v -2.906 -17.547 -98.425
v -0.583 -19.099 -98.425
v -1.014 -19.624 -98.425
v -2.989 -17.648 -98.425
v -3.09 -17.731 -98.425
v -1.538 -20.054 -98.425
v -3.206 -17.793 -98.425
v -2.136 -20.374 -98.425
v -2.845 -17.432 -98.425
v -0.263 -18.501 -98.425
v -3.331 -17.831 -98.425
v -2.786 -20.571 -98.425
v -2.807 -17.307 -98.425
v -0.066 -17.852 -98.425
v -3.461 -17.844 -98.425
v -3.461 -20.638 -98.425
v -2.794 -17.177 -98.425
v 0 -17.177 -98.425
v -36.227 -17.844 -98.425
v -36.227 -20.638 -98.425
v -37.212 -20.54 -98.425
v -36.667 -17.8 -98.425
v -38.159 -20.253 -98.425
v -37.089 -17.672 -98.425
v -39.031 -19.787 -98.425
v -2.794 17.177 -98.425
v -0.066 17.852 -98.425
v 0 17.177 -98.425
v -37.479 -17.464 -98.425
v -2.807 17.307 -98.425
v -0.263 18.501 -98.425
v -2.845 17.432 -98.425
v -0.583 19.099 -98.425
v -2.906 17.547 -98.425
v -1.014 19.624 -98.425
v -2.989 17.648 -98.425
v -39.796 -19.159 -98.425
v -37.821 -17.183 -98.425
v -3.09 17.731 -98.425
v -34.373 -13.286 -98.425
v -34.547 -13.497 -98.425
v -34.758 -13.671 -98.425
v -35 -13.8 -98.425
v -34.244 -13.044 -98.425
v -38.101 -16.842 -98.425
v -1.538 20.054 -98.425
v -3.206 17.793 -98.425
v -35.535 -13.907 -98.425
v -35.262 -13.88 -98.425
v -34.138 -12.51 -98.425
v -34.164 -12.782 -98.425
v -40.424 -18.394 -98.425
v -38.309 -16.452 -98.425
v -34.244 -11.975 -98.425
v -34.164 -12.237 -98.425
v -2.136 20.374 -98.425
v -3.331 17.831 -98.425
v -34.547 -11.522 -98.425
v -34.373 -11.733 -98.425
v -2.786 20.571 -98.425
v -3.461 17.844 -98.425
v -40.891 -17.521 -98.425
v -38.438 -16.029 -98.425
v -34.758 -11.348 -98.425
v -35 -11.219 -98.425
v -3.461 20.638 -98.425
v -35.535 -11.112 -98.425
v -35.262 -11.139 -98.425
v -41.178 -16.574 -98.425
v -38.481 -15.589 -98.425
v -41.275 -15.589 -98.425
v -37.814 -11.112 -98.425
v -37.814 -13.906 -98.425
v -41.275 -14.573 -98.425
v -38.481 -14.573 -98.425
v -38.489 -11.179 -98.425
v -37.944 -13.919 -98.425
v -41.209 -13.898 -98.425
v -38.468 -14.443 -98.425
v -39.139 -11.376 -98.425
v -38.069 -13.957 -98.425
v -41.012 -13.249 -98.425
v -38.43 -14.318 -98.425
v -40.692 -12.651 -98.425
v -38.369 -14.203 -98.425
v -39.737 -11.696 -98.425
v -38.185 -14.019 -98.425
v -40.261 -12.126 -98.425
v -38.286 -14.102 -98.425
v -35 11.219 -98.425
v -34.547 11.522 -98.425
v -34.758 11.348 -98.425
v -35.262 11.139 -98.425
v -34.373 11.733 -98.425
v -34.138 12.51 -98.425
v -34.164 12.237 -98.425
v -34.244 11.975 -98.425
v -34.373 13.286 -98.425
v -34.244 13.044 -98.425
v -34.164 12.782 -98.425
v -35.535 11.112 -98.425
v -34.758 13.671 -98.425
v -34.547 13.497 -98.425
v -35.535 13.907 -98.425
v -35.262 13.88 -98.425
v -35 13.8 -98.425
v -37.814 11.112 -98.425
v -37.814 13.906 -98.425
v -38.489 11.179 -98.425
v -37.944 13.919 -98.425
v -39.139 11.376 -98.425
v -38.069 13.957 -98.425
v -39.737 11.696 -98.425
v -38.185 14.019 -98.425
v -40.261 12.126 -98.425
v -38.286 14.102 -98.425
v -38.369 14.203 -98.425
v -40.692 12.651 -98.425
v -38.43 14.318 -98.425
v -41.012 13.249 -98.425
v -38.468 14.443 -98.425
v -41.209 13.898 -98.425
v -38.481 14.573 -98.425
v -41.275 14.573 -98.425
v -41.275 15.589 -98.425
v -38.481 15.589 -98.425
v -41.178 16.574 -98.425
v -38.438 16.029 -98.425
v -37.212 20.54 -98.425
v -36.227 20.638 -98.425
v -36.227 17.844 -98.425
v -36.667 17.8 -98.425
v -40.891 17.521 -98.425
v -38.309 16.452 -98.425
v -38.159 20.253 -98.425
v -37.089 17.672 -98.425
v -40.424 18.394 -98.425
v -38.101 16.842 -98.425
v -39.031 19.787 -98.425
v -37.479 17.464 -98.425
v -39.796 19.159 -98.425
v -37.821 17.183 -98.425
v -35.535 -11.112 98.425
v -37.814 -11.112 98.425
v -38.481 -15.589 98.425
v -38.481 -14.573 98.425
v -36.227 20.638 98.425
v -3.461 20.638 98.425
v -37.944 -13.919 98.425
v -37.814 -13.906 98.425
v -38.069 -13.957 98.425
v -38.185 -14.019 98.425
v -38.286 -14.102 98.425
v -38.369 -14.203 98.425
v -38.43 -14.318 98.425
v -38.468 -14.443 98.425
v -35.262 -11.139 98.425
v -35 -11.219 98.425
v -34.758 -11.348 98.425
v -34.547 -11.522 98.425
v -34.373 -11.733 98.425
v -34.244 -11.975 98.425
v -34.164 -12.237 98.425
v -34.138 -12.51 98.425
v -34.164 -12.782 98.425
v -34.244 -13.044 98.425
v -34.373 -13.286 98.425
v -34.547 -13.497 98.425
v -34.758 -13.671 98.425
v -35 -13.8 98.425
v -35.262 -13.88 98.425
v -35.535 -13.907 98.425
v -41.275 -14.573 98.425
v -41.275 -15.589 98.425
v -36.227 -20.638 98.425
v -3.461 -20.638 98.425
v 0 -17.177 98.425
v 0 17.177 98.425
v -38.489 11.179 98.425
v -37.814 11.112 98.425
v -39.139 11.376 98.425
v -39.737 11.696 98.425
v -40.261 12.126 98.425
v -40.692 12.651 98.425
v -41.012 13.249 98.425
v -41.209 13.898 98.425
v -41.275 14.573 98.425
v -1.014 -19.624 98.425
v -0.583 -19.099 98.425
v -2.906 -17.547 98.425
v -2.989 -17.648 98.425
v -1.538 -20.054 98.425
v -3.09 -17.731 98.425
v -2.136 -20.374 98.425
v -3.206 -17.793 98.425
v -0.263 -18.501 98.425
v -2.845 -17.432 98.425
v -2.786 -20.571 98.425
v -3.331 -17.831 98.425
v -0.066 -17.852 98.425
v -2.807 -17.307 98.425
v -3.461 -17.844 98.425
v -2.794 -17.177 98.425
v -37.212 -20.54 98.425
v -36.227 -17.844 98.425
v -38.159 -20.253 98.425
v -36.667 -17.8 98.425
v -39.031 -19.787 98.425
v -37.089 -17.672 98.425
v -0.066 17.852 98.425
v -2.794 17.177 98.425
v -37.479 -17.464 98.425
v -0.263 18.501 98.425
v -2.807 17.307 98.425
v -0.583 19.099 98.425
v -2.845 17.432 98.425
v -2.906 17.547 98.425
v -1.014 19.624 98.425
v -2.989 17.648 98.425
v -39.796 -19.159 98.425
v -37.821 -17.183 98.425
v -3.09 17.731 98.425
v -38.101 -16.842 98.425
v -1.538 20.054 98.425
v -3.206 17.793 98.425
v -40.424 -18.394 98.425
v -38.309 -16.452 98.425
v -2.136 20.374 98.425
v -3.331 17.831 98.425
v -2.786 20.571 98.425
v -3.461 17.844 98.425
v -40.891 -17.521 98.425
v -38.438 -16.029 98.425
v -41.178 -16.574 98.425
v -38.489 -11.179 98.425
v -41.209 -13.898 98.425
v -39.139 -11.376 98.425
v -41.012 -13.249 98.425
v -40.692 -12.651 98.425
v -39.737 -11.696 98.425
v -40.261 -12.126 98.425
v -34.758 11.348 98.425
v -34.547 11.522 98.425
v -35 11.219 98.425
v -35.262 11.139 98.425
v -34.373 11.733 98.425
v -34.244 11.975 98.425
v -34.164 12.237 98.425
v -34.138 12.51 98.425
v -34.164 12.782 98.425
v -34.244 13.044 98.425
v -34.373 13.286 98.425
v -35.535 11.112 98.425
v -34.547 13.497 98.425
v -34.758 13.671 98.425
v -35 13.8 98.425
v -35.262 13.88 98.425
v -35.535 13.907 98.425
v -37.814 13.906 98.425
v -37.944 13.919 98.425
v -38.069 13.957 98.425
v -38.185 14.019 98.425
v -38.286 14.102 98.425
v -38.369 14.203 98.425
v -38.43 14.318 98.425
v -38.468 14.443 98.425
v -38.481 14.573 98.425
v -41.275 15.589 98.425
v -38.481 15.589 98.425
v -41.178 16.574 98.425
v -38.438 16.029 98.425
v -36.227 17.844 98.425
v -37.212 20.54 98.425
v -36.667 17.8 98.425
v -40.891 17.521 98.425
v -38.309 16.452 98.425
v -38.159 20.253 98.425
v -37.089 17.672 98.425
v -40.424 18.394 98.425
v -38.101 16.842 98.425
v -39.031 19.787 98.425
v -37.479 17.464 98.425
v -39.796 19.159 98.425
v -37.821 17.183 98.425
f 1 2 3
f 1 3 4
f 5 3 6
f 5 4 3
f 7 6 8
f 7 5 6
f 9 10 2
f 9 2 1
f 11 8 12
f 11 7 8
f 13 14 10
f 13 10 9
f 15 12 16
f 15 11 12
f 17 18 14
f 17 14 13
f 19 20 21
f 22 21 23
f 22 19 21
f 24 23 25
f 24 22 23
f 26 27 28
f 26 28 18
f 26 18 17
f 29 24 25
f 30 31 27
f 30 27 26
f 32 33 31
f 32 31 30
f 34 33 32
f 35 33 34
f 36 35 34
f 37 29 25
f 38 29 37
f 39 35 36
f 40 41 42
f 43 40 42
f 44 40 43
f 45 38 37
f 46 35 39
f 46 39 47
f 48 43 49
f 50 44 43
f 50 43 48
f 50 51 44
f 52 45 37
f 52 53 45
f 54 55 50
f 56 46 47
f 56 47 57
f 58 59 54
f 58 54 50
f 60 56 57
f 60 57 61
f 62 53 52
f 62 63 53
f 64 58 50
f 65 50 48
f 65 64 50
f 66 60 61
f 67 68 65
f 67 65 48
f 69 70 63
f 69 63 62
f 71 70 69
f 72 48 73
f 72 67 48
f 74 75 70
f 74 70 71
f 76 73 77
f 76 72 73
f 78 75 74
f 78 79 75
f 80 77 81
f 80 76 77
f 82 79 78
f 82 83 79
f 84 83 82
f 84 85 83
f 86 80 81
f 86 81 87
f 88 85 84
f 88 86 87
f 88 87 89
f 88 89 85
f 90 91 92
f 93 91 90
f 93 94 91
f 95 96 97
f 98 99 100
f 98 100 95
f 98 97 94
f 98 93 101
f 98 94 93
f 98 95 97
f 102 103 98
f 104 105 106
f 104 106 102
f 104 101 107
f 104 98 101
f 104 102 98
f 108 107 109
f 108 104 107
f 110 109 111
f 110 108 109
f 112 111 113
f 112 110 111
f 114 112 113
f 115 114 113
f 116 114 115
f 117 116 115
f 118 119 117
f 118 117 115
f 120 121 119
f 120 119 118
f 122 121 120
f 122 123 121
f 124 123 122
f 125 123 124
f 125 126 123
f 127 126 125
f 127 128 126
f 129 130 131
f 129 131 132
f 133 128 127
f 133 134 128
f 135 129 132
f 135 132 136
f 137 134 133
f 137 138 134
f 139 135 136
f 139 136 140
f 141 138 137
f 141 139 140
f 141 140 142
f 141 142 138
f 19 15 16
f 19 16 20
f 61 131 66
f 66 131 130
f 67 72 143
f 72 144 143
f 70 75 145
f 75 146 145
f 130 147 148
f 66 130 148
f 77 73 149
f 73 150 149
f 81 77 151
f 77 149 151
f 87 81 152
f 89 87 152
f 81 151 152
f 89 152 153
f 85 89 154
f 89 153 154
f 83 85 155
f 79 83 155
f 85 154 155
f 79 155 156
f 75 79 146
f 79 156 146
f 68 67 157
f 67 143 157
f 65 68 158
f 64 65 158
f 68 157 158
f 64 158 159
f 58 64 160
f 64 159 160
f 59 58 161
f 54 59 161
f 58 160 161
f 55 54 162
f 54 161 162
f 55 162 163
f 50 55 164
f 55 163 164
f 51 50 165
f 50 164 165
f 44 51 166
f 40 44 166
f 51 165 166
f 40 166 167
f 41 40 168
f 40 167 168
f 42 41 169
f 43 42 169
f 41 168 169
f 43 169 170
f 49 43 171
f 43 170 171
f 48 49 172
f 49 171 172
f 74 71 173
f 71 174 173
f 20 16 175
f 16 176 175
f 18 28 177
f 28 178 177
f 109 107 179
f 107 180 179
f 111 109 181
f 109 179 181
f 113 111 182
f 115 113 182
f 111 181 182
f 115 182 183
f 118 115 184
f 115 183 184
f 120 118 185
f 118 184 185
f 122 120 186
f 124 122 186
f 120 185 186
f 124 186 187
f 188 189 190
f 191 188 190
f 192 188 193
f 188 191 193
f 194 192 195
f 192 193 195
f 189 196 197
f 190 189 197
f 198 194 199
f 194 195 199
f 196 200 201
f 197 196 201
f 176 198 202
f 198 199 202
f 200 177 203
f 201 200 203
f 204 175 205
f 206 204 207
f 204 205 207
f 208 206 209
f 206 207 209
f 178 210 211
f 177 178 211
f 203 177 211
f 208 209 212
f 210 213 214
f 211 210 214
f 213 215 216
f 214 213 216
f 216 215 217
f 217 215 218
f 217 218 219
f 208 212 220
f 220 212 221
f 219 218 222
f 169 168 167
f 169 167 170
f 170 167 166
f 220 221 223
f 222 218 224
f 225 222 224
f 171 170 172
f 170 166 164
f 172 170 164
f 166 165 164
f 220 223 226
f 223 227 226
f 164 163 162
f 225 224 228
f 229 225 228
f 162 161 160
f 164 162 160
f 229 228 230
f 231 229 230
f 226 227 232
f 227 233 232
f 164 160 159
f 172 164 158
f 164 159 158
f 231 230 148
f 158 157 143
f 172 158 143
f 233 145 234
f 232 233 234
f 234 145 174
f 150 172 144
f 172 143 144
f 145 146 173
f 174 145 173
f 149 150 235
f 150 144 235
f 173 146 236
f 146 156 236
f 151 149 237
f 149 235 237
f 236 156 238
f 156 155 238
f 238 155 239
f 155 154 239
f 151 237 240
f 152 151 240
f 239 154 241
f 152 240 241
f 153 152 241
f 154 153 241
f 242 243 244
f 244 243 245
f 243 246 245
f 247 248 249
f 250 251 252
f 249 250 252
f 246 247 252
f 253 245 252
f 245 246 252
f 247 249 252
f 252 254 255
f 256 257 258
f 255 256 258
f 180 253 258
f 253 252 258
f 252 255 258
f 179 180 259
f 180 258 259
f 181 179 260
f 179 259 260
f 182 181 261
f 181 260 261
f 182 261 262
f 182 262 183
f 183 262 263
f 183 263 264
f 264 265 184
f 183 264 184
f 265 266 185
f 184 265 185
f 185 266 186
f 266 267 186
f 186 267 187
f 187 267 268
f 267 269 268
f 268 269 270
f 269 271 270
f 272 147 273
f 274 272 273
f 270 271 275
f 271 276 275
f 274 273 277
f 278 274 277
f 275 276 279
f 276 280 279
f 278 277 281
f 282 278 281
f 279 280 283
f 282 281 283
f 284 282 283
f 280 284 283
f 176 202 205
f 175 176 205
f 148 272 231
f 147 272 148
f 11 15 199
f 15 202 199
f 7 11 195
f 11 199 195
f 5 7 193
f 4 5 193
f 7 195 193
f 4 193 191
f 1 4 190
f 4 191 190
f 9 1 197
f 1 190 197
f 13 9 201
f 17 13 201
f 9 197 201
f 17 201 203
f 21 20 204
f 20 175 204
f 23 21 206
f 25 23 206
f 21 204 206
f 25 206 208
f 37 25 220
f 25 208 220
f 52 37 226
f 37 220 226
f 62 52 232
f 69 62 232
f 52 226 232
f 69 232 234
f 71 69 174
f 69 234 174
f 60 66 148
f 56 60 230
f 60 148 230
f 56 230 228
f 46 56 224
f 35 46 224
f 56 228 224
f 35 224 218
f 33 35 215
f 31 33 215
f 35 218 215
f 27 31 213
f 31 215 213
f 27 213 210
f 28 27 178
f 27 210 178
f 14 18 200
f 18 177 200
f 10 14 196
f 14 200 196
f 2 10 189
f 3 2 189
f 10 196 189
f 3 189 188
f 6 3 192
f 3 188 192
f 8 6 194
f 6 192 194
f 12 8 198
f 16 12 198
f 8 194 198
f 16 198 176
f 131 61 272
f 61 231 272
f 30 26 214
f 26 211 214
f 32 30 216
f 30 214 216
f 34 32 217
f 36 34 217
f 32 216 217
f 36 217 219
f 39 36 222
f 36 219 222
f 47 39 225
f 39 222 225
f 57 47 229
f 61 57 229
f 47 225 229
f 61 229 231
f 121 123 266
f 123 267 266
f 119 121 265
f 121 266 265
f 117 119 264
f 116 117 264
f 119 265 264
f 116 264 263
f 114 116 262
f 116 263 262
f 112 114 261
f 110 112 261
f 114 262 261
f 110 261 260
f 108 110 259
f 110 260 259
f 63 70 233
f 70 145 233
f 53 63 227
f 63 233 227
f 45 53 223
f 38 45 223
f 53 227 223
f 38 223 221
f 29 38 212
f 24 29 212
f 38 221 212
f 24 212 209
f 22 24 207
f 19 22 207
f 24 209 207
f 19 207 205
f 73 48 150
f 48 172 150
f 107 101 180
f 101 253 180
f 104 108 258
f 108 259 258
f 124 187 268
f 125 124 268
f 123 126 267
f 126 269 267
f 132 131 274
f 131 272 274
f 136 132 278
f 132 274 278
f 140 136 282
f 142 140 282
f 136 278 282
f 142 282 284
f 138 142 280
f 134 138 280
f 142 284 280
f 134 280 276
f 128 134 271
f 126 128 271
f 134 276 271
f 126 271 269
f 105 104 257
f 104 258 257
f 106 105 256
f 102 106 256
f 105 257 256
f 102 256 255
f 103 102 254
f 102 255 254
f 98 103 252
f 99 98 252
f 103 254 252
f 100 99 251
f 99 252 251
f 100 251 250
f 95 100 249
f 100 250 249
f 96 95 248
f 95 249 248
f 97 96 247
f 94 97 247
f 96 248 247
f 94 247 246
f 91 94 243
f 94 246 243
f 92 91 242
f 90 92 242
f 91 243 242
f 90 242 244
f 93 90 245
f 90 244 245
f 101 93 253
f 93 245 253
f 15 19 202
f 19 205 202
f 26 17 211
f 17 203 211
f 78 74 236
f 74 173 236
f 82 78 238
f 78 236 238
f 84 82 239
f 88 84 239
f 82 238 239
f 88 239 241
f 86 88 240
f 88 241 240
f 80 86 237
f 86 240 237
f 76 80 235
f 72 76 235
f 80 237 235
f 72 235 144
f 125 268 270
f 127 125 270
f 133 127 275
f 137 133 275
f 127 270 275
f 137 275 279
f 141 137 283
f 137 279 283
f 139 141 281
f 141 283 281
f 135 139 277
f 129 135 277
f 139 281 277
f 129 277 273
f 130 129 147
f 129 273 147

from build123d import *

# Parameters (mm, degrees)
BOSS_EXTRUDE1_DEPTH = 98.425


with BuildPart() as part:
    # Sketch1 → Boss-Extrude1 (new, symmetric)
    with BuildSketch(Plane.XY):
        with BuildLine():
            Line((-36.22675, 20.6375), (-3.46075, 20.6375))
            ThreePointArc((-3.46075, 20.6375), (-1.013630207, 19.623869793), (0, 17.17675))
            Line((0, 17.17675), (0, -17.17675))
            ThreePointArc((0, -17.17675), (-1.013630207, -19.623869793), (-3.46075, -20.6375))
            Line((-3.46075, -20.6375), (-36.22675, -20.6375))
            ThreePointArc((-36.22675, -20.6375), (-39.796401808, -19.158901808), (-41.275, -15.58925))
            Line((-41.275, -15.58925), (-41.275, -14.57325))
            ThreePointArc((-41.275, -14.57325), (-40.261369793, -12.126130207), (-37.81425, -11.1125))
            Line((-37.81425, -11.1125), (-35.5346, -11.1125))
            ThreePointArc((-35.5346, -11.1125), (-34.1376, -12.5095), (-35.5346, -13.9065))
            Line((-35.5346, -13.9065), (-37.81425, -13.9065))
            ThreePointArc((-37.81425, -13.9065), (-38.285713446, -14.101786554), (-38.481, -14.57325))
            Line((-38.481, -14.57325), (-38.481, -15.58925))
            ThreePointArc((-38.481, -15.58925), (-37.820745461, -17.183245461), (-36.22675, -17.8435))
            Line((-36.22675, -17.8435), (-3.46075, -17.8435))
            ThreePointArc((-3.46075, -17.8435), (-2.989286554, -17.648213446), (-2.794, -17.17675))
            Line((-2.794, -17.17675), (-2.794, 17.17675))
            ThreePointArc((-2.794, 17.17675), (-2.989286554, 17.648213446), (-3.46075, 17.8435))
            Line((-3.46075, 17.8435), (-36.22675, 17.8435))
            ThreePointArc((-36.22675, 17.8435), (-37.820745461, 17.183245461), (-38.481, 15.58925))
            Line((-38.481, 15.58925), (-38.481, 14.57325))
            ThreePointArc((-38.481, 14.57325), (-38.285713446, 14.101786554), (-37.81425, 13.9065))
            Line((-37.81425, 13.9065), (-35.5346, 13.9065))
            ThreePointArc((-35.5346, 13.9065), (-34.1376, 12.5095), (-35.5346, 11.1125))
            Line((-35.5346, 11.1125), (-37.81425, 11.1125))
            ThreePointArc((-37.81425, 11.1125), (-40.261369793, 12.126130207), (-41.275, 14.57325))
            Line((-41.275, 14.57325), (-41.275, 15.58925))
            ThreePointArc((-41.275, 15.58925), (-39.796401808, 19.158901808), (-36.22675, 20.6375))
        make_face()
    extrude(amount=BOSS_EXTRUDE1_DEPTH, both=True)


solid = part.part
